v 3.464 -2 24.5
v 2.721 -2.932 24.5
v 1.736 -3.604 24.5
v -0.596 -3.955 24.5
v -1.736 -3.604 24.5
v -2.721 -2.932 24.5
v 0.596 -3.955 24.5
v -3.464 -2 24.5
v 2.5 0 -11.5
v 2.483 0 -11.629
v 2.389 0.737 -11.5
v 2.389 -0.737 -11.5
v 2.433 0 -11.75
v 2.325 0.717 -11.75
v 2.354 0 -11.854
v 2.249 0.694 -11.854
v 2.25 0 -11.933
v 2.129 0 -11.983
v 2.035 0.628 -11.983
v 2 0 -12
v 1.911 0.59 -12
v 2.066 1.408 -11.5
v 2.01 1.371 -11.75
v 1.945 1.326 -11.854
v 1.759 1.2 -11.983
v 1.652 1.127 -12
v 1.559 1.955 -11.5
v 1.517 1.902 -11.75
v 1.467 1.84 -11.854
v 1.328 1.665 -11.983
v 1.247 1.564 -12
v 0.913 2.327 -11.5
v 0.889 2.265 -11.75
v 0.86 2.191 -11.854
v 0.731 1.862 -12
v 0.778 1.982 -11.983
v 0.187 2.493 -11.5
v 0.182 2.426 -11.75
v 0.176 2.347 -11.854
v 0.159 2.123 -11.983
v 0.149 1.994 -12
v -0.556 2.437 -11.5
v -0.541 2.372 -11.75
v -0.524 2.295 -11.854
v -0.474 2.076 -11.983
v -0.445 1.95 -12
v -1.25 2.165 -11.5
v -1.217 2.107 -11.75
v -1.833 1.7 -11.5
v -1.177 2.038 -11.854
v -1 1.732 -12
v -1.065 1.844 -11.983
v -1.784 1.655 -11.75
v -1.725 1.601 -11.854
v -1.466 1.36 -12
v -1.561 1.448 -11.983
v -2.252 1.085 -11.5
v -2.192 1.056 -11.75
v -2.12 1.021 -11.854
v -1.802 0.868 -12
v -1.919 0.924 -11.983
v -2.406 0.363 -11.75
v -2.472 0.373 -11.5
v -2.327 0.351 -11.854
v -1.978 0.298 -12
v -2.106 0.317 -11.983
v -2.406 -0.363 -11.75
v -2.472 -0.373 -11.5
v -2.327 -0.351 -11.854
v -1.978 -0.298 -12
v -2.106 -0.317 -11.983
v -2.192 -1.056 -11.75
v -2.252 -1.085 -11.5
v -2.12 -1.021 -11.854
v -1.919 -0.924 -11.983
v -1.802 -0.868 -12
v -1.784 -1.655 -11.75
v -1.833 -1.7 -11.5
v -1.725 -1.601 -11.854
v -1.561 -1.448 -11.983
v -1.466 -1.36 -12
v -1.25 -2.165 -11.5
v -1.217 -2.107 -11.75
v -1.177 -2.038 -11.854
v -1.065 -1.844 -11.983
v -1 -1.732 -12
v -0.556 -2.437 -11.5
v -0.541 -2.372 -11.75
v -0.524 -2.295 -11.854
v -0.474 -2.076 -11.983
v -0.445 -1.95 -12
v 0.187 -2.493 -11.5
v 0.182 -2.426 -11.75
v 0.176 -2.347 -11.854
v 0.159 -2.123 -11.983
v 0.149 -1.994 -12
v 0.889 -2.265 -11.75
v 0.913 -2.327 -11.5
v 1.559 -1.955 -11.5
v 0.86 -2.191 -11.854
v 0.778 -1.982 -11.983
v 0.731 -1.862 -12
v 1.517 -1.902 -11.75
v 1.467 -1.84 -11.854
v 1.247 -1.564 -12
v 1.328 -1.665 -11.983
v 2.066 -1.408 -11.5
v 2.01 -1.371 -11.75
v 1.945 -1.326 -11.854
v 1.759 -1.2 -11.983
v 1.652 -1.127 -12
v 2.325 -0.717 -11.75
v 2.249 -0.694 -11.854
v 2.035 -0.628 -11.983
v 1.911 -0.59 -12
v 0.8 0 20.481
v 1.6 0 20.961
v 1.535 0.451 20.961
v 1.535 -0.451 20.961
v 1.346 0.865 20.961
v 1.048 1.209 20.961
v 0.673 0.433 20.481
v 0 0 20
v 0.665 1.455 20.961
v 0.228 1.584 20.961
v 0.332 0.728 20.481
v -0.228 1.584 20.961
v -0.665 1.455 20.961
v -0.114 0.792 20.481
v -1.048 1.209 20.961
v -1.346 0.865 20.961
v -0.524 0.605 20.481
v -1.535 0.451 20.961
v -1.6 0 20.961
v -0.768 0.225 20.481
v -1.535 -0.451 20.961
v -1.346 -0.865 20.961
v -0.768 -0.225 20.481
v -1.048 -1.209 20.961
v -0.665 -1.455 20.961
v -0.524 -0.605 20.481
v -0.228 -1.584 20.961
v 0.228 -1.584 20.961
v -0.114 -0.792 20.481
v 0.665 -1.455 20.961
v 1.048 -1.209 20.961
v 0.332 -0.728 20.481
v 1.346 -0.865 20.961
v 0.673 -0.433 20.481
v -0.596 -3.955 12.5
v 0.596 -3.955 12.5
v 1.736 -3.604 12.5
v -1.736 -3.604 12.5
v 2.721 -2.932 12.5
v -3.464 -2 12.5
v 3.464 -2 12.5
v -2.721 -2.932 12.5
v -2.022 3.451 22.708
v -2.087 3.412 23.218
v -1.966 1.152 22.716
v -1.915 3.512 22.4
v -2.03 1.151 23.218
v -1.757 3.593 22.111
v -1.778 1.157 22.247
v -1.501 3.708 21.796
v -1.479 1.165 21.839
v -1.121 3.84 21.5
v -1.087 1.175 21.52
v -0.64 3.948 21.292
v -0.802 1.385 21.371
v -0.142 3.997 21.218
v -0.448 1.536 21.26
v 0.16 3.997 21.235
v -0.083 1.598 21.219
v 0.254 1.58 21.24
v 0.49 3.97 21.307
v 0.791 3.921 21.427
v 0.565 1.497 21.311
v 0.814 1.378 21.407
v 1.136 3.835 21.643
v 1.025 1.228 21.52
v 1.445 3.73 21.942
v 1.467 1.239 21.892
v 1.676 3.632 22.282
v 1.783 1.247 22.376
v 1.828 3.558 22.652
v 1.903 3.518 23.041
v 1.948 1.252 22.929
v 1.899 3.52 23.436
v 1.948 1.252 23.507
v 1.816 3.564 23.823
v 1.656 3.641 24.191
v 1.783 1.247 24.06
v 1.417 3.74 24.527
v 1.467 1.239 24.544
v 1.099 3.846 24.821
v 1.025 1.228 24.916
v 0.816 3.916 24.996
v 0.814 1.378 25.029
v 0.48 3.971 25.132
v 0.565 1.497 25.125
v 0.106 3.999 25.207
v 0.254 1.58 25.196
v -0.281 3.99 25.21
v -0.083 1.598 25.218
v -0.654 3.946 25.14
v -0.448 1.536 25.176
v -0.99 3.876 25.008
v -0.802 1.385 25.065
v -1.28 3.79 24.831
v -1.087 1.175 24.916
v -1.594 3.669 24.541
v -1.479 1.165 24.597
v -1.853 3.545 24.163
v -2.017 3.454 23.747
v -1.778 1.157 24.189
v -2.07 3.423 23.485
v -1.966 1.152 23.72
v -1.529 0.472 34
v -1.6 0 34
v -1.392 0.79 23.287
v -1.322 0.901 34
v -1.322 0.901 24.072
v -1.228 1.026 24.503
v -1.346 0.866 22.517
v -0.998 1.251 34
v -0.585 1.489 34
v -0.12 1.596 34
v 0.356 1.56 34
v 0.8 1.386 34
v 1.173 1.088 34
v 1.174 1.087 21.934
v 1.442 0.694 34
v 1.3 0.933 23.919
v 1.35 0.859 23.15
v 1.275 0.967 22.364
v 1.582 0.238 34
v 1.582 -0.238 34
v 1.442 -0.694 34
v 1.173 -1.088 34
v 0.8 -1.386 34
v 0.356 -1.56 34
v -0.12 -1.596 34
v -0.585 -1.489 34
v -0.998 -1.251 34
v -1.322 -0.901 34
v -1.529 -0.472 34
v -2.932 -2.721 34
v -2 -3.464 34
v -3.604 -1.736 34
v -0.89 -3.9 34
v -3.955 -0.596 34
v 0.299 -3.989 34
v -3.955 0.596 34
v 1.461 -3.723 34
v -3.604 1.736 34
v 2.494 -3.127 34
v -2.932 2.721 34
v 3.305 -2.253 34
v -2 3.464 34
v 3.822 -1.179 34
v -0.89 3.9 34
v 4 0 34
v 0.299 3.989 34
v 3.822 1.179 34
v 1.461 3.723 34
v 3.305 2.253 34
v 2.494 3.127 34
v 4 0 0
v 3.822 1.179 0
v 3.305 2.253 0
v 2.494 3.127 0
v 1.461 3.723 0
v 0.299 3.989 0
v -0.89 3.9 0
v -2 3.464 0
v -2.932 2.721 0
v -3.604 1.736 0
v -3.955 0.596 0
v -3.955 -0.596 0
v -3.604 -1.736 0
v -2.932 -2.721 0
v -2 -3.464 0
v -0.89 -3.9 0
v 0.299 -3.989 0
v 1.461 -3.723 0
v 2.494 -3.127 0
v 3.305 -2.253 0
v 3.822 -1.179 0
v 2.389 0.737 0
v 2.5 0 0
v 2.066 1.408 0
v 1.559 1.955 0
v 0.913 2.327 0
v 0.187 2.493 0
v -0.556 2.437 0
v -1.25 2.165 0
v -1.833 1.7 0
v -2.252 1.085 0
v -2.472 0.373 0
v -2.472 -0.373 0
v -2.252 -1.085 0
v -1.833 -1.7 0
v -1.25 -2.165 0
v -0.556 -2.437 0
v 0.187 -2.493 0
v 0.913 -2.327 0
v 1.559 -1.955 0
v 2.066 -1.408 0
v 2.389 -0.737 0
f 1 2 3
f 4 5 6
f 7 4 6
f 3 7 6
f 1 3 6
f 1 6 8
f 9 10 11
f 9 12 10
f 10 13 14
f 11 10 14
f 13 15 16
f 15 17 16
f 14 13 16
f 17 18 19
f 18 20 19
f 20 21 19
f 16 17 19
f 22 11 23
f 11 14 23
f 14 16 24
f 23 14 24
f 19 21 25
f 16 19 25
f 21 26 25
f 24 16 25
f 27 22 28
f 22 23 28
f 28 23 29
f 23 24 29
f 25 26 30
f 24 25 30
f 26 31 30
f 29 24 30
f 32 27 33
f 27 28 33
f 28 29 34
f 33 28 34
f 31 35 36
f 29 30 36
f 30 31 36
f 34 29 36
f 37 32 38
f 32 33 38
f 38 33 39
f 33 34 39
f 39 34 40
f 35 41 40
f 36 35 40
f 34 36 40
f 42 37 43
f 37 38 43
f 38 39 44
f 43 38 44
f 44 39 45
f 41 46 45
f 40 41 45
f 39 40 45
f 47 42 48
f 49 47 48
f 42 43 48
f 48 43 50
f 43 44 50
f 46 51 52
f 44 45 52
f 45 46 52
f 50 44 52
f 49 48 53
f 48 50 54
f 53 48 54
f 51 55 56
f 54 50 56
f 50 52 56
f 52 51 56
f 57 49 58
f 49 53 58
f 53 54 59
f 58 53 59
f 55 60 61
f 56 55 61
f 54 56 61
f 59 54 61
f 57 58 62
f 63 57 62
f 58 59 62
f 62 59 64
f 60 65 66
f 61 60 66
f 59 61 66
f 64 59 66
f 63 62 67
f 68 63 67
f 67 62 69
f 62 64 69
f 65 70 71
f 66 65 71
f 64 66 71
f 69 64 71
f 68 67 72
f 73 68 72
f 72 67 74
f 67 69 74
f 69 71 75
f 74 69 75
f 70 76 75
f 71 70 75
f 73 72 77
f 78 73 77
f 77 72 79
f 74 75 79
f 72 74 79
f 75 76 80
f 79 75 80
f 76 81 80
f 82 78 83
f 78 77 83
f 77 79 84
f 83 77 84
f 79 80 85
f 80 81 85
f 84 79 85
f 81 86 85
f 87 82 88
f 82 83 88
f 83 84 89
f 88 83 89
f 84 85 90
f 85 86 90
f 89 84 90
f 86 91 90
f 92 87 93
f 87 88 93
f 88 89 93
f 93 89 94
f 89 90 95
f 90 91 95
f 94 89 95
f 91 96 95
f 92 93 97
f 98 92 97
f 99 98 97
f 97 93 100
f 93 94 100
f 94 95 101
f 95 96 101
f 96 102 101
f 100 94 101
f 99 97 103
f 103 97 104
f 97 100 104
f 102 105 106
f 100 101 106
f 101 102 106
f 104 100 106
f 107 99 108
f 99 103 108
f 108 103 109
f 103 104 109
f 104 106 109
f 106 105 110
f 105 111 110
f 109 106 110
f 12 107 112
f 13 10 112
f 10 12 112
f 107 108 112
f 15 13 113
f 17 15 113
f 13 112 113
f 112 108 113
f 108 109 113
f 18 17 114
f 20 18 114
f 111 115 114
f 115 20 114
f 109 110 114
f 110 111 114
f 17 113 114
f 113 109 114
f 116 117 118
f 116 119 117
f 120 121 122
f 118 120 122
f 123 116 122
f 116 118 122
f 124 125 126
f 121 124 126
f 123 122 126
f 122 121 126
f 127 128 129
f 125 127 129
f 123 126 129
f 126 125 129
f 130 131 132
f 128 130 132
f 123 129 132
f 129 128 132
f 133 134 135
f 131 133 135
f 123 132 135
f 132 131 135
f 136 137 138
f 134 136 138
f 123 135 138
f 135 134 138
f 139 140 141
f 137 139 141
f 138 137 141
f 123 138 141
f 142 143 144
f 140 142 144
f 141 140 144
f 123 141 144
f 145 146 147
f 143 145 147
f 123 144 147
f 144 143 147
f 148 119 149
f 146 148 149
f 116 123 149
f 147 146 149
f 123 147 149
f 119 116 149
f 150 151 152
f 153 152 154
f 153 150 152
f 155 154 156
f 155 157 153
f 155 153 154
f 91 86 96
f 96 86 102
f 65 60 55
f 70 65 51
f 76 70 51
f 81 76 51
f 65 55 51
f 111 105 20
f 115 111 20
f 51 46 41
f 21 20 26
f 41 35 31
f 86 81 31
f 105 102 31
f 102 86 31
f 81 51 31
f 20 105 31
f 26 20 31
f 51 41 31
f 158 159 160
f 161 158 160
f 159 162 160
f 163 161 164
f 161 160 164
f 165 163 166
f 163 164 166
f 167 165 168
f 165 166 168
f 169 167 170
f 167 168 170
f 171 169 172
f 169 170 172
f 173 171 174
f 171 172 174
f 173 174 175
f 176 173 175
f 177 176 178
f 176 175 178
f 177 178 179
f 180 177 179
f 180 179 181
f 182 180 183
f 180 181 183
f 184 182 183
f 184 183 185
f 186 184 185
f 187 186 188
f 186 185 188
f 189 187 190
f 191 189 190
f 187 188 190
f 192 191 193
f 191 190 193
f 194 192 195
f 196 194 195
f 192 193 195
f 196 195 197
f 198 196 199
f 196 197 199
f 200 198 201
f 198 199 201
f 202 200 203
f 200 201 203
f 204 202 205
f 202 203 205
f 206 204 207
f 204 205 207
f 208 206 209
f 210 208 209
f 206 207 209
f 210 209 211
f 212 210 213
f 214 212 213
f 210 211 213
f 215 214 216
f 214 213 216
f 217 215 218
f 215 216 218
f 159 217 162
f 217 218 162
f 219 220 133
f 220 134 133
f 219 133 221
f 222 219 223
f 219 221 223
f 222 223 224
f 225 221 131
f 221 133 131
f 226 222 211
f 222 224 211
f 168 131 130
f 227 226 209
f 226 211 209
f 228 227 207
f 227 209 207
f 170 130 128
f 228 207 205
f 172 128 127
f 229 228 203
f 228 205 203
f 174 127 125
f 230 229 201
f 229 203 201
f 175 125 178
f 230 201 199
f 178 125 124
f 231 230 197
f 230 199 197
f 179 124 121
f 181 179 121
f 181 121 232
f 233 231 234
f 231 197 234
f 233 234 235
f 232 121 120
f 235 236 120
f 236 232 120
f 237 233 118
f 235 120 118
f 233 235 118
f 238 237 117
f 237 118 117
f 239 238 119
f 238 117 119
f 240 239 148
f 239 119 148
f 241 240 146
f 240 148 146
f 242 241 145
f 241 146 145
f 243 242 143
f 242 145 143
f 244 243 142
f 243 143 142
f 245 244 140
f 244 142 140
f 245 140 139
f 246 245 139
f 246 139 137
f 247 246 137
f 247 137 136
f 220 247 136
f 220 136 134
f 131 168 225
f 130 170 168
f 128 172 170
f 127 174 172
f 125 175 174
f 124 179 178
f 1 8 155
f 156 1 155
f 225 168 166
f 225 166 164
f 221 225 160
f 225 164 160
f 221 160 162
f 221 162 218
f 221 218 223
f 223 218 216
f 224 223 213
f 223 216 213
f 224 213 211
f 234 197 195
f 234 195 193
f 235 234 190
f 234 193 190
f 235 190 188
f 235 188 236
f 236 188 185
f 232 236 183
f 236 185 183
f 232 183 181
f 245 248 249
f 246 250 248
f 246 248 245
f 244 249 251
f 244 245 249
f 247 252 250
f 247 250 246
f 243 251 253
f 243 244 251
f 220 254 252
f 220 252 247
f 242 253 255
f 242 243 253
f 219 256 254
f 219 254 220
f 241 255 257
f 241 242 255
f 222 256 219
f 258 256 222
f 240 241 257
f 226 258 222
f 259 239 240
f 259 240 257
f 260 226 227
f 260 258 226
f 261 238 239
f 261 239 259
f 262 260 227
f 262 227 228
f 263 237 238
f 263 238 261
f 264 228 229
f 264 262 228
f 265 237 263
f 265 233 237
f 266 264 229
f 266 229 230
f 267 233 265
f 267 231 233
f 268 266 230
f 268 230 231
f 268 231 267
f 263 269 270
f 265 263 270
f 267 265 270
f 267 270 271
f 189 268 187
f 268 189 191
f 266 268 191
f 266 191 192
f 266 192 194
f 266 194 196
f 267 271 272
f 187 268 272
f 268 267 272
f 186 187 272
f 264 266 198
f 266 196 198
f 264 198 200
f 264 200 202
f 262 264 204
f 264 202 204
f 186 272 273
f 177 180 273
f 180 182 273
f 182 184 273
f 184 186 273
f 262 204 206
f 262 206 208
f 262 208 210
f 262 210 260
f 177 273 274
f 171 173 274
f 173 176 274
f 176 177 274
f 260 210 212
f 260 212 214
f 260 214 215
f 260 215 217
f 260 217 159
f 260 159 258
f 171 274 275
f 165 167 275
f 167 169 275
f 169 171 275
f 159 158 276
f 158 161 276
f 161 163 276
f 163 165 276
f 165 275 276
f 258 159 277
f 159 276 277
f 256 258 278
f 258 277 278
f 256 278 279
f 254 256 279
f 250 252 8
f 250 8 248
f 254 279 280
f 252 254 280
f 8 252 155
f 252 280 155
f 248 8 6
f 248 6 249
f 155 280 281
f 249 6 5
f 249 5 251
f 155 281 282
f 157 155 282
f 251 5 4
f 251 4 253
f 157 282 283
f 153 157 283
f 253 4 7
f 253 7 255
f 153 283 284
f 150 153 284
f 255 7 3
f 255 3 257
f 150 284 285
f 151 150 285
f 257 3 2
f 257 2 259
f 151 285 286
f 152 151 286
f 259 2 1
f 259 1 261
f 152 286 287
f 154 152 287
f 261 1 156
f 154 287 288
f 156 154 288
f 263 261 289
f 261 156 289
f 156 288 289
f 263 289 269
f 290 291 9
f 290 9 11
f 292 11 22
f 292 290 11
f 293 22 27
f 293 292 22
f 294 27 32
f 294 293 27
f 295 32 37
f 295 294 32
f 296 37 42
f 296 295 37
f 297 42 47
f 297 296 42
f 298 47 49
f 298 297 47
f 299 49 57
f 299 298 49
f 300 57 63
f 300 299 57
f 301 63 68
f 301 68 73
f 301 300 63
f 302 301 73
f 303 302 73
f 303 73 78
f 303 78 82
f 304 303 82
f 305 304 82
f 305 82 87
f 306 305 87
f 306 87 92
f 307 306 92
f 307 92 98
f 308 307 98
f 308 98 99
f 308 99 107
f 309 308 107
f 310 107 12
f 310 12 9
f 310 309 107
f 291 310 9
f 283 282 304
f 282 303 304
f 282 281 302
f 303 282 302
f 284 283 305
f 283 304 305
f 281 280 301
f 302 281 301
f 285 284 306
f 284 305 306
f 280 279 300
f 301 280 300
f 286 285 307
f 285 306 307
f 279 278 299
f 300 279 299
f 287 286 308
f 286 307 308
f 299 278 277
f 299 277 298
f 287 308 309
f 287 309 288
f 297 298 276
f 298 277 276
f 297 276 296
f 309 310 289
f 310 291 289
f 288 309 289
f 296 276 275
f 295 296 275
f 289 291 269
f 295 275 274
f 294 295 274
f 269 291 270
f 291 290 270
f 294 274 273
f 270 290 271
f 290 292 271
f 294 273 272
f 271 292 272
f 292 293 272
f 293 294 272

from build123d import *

# Parameters (mm, degrees)
SKETCH1_R                      = 2.5
BOSS_EXTRUDE1_DEPTH            = 12
SKETCH2_R                      = 4
BOSS_EXTRUDE2_DEPTH            = 34
F_3_2_3_2_DIAMETER_HOLE1_D     = 3.2
F_3_2_3_2_DIAMETER_HOLE1_DEPTH = 13.03862301
F_3_2_3_2_DIAMETER_HOLE1_TIP   = 0.96137699
CUT_EXTRUDE1_DEPTH             = 35.467375879
CUT_EXTRUDE1_DEPTH_BACK        = 35.467375879
SKETCH6_W                      = 12
SKETCH6_H                      = 2
F_4_0_4_DIAMETER_HOLE3_D       = 4
F_4_0_4_DIAMETER_HOLE3_DEPTH   = 2.798278762
F_4_0_4_DIAMETER_HOLE3_TIP     = 1.201721238
FILLET1_R                      = 0.5


with BuildPart() as part:
    # Sketch1 → Boss-Extrude1 (new body)
    with BuildSketch(Plane.XY):
        Circle(SKETCH1_R)
    extrude(amount=-BOSS_EXTRUDE1_DEPTH)

    # Sketch2 → Boss-Extrude2 (add)
    with BuildSketch(Plane.XY):
        Circle(SKETCH2_R)
    extrude(amount=BOSS_EXTRUDE2_DEPTH)

    # Ø3.2 (3.2) Diameter Hole1
    with Locations(Plane.XY.offset(34)):
        with Locations((0, 0)):
            Hole(F_3_2_3_2_DIAMETER_HOLE1_D / 2, depth=F_3_2_3_2_DIAMETER_HOLE1_DEPTH)
            with Locations((0, 0, -(F_3_2_3_2_DIAMETER_HOLE1_DEPTH + F_3_2_3_2_DIAMETER_HOLE1_TIP / 2))):  # 118° drill point
                Cone(0, F_3_2_3_2_DIAMETER_HOLE1_D / 2, F_3_2_3_2_DIAMETER_HOLE1_TIP, mode=Mode.SUBTRACT)

    # Sketch6 → Cut-Extrude1 (cut, two sides: drawn at the far end of the back side and taken through both)
    with BuildSketch(Plane(origin=(0, 0, 0), x_dir=(0, 0, -1), z_dir=(1, 0, 0)).offset(-CUT_EXTRUDE1_DEPTH_BACK)):
        with Locations((-18.5, -3)):
            Rectangle(SKETCH6_W, SKETCH6_H)
    extrude(amount=CUT_EXTRUDE1_DEPTH + CUT_EXTRUDE1_DEPTH_BACK, mode=Mode.SUBTRACT)

    # Ø4.0 (4) Diameter Hole3
    with Locations(Plane(origin=(-0.101557348, 3.998710555, 23.218070674), x_dir=(0.999677638825, 0.025389337009, 0), z_dir=(-0.025389337009, 0.999677638825, 0))):
        with Locations((0, 0)):
            Hole(F_4_0_4_DIAMETER_HOLE3_D / 2, depth=F_4_0_4_DIAMETER_HOLE3_DEPTH)
            with Locations((0, 0, -(F_4_0_4_DIAMETER_HOLE3_DEPTH + F_4_0_4_DIAMETER_HOLE3_TIP / 2))):  # 118° drill point
                Cone(0, F_4_0_4_DIAMETER_HOLE3_D / 2, F_4_0_4_DIAMETER_HOLE3_TIP, mode=Mode.SUBTRACT)

    # Fillet1
    fillet1_edges = [part.edges().sort_by_distance(p)[0] for p in [
        (-2.5, 0, -12),
    ]]
    fillet(fillet1_edges, radius=FILLET1_R)


solid = part.part
